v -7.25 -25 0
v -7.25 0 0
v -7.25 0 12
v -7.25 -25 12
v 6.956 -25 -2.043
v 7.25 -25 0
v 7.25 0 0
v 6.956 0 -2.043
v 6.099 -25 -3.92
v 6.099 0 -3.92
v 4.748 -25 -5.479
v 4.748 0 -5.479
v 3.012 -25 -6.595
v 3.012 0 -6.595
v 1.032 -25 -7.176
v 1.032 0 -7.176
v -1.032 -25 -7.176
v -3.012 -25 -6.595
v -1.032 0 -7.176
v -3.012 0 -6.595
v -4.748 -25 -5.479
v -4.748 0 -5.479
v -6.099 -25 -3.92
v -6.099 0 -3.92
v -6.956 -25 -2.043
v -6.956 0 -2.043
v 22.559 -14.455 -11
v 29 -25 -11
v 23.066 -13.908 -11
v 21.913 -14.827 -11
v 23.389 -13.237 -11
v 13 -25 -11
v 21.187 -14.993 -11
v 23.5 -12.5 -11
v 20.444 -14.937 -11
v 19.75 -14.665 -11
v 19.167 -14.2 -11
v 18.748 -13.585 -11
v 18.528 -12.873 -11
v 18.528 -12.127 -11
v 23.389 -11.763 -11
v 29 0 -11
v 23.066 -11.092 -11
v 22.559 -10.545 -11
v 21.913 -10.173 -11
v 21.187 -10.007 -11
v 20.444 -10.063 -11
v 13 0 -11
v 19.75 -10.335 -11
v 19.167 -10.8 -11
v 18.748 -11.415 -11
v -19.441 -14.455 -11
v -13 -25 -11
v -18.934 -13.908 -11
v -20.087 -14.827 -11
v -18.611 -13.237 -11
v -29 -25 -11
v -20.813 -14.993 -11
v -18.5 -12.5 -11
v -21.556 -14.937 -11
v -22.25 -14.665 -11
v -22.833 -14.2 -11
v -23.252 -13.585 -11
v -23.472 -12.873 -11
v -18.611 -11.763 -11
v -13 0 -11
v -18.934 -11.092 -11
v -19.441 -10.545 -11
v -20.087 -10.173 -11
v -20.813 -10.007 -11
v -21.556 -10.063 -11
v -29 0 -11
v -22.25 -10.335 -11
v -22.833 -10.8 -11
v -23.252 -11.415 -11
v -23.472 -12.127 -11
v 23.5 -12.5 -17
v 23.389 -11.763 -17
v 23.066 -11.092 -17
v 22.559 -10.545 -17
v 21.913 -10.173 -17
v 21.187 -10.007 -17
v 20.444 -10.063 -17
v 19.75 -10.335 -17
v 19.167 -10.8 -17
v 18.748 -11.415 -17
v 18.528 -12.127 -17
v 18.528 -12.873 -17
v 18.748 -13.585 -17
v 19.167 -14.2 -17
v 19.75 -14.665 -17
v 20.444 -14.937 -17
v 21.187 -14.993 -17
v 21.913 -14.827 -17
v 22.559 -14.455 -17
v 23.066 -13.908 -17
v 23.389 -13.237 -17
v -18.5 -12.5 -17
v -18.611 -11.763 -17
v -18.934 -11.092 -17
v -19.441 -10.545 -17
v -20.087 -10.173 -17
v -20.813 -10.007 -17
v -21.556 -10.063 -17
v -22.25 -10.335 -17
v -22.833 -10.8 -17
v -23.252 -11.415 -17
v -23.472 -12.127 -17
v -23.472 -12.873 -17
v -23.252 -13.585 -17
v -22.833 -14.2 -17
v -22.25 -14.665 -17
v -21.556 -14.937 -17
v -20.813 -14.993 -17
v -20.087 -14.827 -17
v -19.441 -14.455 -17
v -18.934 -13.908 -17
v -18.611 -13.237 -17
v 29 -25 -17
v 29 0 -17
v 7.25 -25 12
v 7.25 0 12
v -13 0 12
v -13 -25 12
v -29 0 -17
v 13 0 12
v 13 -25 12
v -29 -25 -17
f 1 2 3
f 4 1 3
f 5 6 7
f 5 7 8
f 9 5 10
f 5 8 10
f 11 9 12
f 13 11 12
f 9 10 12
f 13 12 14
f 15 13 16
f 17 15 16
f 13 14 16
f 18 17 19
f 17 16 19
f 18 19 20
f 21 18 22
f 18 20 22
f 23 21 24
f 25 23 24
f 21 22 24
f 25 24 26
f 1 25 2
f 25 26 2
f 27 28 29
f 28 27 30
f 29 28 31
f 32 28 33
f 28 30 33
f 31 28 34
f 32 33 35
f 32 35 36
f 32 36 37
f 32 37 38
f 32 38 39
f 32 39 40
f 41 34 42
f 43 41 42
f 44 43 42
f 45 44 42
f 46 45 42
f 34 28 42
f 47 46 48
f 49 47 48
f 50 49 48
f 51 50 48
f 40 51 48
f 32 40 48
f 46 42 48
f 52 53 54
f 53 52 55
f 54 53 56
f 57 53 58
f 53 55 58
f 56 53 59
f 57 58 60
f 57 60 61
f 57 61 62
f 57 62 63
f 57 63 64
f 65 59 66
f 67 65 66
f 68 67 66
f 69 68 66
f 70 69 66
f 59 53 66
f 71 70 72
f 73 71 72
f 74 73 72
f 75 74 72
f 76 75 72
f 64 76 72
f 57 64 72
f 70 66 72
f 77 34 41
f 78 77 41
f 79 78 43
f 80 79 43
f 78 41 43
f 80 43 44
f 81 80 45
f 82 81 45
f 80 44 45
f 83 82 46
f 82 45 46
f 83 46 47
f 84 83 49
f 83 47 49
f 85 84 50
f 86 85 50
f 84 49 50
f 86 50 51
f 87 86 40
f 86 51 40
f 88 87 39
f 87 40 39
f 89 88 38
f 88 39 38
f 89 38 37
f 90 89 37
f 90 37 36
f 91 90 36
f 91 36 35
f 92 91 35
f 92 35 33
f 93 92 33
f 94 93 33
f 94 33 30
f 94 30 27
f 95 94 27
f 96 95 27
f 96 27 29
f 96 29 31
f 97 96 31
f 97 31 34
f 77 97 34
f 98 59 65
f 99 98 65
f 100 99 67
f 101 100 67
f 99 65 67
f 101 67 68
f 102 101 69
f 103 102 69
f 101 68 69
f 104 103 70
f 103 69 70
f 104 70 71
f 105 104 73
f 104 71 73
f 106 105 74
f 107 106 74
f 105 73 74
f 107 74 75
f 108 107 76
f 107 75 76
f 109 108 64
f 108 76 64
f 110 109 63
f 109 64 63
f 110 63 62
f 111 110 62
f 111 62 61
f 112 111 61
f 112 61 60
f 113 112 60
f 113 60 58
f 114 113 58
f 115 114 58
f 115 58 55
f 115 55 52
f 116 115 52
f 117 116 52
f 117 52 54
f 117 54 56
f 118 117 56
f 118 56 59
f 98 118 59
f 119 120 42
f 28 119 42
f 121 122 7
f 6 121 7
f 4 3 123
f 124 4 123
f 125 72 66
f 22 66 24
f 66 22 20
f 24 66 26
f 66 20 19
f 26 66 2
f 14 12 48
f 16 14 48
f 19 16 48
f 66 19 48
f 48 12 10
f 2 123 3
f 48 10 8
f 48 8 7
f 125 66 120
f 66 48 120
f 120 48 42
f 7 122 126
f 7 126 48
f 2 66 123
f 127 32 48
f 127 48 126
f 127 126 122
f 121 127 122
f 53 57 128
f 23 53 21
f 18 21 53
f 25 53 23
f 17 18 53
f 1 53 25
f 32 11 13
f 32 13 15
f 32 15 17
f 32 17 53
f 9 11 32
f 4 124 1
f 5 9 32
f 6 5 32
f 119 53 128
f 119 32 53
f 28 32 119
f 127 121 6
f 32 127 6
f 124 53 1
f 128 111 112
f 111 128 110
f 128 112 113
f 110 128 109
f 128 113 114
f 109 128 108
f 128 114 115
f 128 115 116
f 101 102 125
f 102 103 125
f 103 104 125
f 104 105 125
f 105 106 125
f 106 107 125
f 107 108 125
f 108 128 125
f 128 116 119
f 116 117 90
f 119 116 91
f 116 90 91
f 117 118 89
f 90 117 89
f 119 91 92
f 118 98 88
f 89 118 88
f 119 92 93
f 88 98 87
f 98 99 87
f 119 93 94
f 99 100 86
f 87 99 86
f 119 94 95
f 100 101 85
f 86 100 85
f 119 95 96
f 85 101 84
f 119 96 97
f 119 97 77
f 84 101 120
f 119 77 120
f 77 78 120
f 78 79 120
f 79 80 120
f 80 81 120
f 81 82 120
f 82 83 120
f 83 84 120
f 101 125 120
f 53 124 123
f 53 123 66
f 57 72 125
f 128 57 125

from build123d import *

# Parameters (mm, degrees)
F1_DEPTH = 25
F2_R     = 2.5
F3_DEPTH = 6.001


# Not quite as in the source:
# - a feature names something its author has since deleted; it is built from what else it names


with BuildPart() as f1:
    # F0 (on Front) → F1 (new body)
    with BuildSketch(Plane.XZ):
        with BuildLine():
            ThreePointArc((13, 0), (0, -13), (-13, 0))
            Line((-13, 0), (-13, -11))
            Line((-13, -11), (-29, -11))
            Line((-29, -11), (-29, -17))
            Line((-29, -17), (29, -17))
            Line((29, -17), (29, -11))
            Line((29, -11), (13, -11))
            Line((13, -11), (13, 0))
        make_face()
        with BuildLine():
            Line((-13, 12), (-13, 0))
            ThreePointArc((-13, 0), (0, -13), (13, 0))
            Line((13, 0), (13, 12))
            Line((13, 12), (7.25, 12))
            Line((7.25, 12), (7.25, 0))
            ThreePointArc((7.25, 0), (0, -7.25), (-7.25, 0))
            Line((-7.25, 0), (-7.25, 12))
            Line((-7.25, 12), (-13, 12))
        make_face()
    extrude(amount=F1_DEPTH)

    # F2 (on face) → F3 (cut, through all)
    with BuildSketch(Plane.XY.offset(-11)):
        with Locations((20.9999978542, -12.5)):
            Circle(F2_R)
        with Locations((-20.9999978542, -12.5)):
            Circle(F2_R)
    extrude(amount=-F3_DEPTH, mode=Mode.SUBTRACT)


solid = f1.part
